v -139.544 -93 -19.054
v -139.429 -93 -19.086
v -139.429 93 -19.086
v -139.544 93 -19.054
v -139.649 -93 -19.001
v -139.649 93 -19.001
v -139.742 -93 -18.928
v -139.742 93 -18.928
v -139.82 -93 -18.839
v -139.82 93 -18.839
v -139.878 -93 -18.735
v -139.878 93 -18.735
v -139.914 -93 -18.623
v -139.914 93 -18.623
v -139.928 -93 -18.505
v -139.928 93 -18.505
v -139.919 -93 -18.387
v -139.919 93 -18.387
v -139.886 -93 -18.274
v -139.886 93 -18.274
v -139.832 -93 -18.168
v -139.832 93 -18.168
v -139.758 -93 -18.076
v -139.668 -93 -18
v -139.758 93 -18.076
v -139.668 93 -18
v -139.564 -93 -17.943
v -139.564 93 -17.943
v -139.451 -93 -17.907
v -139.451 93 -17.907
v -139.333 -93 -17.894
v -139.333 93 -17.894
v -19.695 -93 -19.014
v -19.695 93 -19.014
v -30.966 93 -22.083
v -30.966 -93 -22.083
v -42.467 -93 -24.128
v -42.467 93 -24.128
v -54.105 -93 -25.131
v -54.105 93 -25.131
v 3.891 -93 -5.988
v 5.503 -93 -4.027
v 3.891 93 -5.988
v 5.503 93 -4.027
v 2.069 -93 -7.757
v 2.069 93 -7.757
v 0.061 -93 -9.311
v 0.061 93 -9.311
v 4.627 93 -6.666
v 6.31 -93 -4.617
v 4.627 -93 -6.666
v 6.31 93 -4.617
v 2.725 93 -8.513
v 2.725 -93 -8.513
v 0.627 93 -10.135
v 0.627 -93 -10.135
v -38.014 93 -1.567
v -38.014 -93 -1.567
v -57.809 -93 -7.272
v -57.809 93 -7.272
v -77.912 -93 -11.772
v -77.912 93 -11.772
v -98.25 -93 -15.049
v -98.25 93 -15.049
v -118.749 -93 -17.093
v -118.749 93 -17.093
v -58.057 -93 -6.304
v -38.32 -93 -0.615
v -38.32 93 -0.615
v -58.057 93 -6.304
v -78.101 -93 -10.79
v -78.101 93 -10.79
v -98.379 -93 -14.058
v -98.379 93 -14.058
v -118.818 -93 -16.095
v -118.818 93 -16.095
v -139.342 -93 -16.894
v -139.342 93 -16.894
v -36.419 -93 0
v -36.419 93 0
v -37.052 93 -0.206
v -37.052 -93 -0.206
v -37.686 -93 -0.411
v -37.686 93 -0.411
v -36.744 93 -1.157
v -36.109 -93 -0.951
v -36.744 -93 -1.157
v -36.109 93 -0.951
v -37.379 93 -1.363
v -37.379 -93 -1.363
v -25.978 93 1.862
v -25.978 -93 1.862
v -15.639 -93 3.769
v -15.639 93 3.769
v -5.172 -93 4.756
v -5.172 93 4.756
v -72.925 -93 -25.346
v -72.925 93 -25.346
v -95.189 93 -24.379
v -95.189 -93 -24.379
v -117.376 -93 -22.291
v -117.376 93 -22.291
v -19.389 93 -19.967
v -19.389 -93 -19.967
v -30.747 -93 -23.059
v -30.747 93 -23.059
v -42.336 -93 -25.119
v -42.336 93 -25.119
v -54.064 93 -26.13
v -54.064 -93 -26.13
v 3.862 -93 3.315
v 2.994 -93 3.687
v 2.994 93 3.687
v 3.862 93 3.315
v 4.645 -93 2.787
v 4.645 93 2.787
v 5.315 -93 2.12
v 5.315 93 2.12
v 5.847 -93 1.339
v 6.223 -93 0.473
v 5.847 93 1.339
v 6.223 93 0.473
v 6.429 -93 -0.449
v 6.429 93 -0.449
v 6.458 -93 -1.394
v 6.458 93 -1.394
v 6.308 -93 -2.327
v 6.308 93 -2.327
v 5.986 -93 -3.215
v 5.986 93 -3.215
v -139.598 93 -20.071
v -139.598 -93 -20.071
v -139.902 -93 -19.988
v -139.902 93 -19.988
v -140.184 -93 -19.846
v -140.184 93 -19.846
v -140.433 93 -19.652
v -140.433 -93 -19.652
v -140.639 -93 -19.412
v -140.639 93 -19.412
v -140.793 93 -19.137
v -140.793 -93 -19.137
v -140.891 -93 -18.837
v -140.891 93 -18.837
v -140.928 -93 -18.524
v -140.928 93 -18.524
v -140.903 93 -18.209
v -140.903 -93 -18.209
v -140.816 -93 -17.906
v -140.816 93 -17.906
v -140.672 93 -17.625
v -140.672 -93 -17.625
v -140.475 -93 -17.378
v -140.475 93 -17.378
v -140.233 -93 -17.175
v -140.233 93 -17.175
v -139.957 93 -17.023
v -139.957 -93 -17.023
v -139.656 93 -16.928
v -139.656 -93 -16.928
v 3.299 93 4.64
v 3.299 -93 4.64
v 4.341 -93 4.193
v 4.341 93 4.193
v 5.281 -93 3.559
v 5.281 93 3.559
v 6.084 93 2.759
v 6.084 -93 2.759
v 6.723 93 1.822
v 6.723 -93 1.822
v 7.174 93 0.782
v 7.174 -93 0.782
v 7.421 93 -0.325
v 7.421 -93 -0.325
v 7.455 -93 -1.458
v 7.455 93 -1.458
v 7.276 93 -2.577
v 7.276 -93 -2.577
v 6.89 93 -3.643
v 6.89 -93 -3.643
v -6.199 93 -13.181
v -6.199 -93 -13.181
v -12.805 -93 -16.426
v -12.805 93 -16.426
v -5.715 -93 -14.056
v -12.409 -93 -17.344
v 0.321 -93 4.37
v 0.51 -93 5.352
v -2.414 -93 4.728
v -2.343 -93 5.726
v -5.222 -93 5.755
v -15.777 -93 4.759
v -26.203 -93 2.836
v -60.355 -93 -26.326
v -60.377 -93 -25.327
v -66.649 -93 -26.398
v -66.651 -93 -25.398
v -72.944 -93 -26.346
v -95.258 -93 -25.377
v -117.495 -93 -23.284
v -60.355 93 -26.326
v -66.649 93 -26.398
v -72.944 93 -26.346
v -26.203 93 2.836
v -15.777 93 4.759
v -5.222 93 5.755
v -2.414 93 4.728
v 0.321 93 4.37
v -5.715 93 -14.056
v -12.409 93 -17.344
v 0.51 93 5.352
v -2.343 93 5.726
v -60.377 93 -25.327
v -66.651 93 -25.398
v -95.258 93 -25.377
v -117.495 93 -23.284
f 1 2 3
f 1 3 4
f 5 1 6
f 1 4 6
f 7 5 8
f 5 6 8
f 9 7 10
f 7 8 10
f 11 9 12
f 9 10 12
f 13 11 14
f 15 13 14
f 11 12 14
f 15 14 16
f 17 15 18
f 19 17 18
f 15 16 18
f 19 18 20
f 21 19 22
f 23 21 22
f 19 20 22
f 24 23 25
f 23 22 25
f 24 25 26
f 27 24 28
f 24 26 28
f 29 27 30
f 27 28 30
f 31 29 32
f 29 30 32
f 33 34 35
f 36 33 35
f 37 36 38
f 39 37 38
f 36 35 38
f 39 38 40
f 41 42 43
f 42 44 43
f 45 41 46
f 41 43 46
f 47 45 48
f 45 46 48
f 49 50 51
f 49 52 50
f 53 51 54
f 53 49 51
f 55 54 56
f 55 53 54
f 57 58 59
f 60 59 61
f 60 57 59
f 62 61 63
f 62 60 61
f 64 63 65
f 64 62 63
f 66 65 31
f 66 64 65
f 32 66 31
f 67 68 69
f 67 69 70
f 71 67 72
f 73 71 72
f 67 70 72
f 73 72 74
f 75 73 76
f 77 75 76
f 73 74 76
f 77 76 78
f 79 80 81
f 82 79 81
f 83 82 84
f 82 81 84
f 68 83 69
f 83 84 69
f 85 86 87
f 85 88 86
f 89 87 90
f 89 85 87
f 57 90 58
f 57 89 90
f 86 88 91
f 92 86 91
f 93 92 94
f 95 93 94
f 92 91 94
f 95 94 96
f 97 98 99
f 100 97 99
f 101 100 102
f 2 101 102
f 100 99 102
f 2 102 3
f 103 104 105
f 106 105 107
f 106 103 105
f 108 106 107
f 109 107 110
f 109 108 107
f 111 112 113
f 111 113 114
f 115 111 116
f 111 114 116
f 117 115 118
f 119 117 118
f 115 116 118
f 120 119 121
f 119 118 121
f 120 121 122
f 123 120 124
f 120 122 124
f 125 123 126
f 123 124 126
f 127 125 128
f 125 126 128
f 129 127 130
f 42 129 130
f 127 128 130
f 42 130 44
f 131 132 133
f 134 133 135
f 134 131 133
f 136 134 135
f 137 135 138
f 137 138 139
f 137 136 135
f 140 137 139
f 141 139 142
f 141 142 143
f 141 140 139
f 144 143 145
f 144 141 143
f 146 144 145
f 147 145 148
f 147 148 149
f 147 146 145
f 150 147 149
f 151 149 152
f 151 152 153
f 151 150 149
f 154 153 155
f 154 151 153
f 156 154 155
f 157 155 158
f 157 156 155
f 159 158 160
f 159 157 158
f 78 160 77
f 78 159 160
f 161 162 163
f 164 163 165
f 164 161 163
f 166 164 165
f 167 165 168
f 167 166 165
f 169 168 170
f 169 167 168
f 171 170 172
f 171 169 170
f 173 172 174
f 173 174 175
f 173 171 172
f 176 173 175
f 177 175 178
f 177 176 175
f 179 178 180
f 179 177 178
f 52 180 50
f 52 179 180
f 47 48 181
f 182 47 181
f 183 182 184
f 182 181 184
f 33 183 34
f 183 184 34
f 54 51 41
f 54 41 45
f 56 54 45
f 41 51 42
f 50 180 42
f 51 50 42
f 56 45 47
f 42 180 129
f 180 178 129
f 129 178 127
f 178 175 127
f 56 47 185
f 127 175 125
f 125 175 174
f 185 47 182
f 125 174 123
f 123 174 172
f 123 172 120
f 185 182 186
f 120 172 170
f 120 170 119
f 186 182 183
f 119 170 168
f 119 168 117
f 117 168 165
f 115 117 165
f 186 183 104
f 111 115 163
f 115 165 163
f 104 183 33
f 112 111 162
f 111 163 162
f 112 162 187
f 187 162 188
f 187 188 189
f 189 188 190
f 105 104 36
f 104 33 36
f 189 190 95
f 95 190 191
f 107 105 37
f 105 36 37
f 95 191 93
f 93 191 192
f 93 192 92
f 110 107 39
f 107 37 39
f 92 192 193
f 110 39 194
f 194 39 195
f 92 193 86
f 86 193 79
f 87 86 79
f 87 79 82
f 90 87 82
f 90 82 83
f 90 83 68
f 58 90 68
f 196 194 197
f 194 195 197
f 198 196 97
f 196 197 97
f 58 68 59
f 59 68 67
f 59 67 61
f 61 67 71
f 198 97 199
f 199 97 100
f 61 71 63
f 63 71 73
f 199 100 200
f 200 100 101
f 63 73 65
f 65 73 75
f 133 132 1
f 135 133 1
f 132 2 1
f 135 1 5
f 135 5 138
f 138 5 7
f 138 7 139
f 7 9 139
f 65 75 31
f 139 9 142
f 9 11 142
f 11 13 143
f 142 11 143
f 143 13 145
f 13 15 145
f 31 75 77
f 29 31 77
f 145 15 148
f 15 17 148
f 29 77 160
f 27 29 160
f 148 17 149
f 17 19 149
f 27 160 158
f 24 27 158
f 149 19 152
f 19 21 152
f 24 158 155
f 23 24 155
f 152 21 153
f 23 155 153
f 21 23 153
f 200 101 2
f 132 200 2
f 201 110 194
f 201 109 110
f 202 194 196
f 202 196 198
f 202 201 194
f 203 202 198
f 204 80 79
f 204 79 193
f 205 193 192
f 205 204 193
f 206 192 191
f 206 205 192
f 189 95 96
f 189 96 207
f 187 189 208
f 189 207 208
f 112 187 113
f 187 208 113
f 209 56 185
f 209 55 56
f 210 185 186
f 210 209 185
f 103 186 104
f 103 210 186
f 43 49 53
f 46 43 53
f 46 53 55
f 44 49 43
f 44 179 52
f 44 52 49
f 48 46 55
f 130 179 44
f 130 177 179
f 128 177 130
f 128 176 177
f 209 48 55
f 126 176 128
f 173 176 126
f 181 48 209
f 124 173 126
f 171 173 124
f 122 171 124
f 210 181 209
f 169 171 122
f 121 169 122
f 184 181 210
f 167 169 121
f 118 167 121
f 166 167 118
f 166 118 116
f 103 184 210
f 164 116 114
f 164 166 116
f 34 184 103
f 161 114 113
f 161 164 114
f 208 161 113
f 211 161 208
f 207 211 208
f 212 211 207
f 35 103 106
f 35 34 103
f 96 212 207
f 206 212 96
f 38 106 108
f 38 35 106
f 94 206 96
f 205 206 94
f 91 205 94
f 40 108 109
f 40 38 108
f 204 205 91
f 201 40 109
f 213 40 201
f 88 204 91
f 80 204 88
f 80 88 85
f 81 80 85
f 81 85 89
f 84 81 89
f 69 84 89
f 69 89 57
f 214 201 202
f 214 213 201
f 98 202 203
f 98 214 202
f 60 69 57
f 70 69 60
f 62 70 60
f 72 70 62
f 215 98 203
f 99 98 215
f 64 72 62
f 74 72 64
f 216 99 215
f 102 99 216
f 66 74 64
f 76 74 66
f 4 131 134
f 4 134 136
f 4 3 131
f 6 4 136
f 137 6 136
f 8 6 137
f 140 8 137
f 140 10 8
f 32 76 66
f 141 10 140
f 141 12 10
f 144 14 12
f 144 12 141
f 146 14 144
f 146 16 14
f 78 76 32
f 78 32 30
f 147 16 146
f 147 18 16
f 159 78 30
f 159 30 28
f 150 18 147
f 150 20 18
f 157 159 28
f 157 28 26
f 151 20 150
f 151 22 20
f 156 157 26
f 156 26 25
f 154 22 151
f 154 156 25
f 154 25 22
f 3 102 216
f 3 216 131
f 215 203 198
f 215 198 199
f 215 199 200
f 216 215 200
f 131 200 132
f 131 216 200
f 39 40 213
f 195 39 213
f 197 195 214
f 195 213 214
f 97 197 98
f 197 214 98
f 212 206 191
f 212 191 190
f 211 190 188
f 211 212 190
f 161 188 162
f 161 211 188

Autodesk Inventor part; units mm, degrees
ref_plane "YZ Plane" through (0, 0, 0) normal (1, 0, 0) x (0, 1, 0)
ref_plane "XZ Plane" through (0, 0, 0) normal (0, 1, 0) x (-1, 0, 0)
ref_plane "XY Plane" through (0, 0, 0) normal (0, 0, 1) x (1, 0, 0)
sketch "スケッチ1" plane through (0, 0, 0) normal (0, 1, 0) x (-1, 0, 0)
  arc A0 (72.9254, -25.3463) -> (139.4294, -19.0858) centre (64.9013, 416.2515) ccw projected
  arc A1 (54.1052, -25.1311) -> (72.9254, -25.3463) centre (67.1484, 292.5868) ccw projected
  arc A2 (19.6951, -19.0145) -> (54.1052, -25.1311) centre (59.4352, 104.7024) ccw projected
  arc A3 (-0.0609, -9.311) -> (19.6951, -19.0145) centre (42.8692, 53.13) ccw projected
  arc A4 (-5.5029, -4.0266) -> (-0.0609, -9.311) centre (12.76, 9.3368) ccw projected
  arc A5 (-2.9938, 3.6874) -> (-5.5029, -4.0266) centre (-1.4678, -1.074) ccw projected
  arc A6 (5.1717, 4.7562) -> (-2.9938, 3.6874) centre (4.0256, -18.2153) ccw projected
  arc A7 (36.109, -0.9508) -> (5.1717, 4.7562) centre (-0.7578, -114.096) ccw projected
  arc A8 (36.109, -0.9508) -> (38.0145, -1.5673) centre (185.125, 456.3841) ccw projected
  arc A9 (38.0145, -1.5673) -> (139.3334, -17.8944) centre (142.307, 323.0926) ccw projected
  arc A10 (139.4294, -19.0858) -> (139.3334, -17.8944) centre (139.3282, -18.4944) ccw projected
  circle A11 centre (6.8478, -1.4519) radius 3 projected
  circle A12 centre (92.934, -19.7045) radius 3 projected
  point P0 (0, 0)
extrude "押し出し1" add sketch "スケッチ1" along normal mid plane 186 contours A1 A2 A3 A4 A5 A6 A7 A8 A9 A10 A0 | A11 | A12
shell "シェル1" thickness 1 outward yes removed faces 2 at (-47.7634, 93, -11.4021) at (-47.7634, -93, -11.4021)
properties part number "GFRP_sub"
